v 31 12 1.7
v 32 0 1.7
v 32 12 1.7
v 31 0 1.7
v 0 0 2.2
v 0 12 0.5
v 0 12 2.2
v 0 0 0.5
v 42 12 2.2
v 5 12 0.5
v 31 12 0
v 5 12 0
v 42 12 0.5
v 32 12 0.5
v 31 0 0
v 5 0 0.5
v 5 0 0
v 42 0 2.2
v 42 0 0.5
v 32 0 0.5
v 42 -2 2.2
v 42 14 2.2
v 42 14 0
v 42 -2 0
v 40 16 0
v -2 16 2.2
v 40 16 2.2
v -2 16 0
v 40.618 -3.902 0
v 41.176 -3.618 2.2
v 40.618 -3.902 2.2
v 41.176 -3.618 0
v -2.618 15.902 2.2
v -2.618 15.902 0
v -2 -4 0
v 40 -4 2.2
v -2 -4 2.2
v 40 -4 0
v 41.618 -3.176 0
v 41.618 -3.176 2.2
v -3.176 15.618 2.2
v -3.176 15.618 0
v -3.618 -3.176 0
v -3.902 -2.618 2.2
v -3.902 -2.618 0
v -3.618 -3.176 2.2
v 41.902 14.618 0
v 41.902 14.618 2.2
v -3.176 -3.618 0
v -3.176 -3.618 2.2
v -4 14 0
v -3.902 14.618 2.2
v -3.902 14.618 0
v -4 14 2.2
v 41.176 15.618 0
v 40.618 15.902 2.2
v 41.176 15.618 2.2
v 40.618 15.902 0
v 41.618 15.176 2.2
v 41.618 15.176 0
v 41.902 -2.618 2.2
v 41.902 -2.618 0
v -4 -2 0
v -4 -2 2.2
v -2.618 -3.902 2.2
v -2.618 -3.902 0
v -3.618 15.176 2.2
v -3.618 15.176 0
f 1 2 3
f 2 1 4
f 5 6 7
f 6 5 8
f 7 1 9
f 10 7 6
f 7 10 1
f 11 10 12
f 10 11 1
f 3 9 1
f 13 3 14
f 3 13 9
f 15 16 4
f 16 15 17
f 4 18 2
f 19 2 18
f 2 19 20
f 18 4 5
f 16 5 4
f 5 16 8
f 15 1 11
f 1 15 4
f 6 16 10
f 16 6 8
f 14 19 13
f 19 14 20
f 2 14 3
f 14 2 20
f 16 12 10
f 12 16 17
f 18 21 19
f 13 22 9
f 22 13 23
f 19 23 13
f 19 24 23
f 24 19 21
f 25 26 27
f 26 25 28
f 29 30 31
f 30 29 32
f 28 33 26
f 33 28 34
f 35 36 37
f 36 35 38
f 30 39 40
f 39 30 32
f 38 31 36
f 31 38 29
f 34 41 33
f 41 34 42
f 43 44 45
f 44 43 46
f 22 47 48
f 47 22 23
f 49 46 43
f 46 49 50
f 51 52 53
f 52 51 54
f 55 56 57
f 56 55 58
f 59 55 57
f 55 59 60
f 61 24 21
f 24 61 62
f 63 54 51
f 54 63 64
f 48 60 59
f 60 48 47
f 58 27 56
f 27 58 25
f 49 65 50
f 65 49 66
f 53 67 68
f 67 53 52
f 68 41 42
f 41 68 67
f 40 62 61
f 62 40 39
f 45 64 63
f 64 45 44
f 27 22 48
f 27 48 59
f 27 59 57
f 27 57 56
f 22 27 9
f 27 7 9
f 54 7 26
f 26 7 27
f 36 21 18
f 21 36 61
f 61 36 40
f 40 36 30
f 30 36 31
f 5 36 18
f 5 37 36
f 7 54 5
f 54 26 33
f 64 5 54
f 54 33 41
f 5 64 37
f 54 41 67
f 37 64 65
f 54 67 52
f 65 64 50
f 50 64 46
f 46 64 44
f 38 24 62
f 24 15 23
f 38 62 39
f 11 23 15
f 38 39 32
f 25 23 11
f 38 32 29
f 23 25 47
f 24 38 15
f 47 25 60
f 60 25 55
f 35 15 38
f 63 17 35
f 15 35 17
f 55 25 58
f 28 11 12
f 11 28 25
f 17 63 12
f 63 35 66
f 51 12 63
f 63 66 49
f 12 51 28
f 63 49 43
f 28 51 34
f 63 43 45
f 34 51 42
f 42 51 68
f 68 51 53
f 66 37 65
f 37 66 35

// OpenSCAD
bodyWid     = 12;
bodyLen     = 38;
bodyDep     = 3;
windowLen   = 26;
windowOff   = 5;
windowDep   = 0.5;

epsilon     = 0.1;

$fn=20;

difference() {
   simpleForm();
   window();
}

module simpleForm(h=2.2) {
   hull() {
      translate([-2,-2,0]) cylinder(r=2,h=h);
      translate([-2,2+bodyWid,0]) cylinder(r=2,h=h);
      translate([2+bodyLen,2+bodyWid,0]) cylinder(r=2,h=h);
      translate([2+bodyLen,-2,0]) cylinder(r=2,h=h);
   }
}

module window() {
   translate([0,0,windowDep+1.2]) cube([bodyLen+5,bodyWid,bodyDep-windowDep]);
   translate([0,0,windowDep]) cube([windowLen+5,bodyWid,bodyDep-windowDep]);
   translate([windowLen+6,0,windowDep]) cube([bodyLen,bodyWid,bodyDep-windowDep]);
   translate([5,0,-epsilon]) cube([windowLen,bodyWid,windowDep+epsilon]);
}
